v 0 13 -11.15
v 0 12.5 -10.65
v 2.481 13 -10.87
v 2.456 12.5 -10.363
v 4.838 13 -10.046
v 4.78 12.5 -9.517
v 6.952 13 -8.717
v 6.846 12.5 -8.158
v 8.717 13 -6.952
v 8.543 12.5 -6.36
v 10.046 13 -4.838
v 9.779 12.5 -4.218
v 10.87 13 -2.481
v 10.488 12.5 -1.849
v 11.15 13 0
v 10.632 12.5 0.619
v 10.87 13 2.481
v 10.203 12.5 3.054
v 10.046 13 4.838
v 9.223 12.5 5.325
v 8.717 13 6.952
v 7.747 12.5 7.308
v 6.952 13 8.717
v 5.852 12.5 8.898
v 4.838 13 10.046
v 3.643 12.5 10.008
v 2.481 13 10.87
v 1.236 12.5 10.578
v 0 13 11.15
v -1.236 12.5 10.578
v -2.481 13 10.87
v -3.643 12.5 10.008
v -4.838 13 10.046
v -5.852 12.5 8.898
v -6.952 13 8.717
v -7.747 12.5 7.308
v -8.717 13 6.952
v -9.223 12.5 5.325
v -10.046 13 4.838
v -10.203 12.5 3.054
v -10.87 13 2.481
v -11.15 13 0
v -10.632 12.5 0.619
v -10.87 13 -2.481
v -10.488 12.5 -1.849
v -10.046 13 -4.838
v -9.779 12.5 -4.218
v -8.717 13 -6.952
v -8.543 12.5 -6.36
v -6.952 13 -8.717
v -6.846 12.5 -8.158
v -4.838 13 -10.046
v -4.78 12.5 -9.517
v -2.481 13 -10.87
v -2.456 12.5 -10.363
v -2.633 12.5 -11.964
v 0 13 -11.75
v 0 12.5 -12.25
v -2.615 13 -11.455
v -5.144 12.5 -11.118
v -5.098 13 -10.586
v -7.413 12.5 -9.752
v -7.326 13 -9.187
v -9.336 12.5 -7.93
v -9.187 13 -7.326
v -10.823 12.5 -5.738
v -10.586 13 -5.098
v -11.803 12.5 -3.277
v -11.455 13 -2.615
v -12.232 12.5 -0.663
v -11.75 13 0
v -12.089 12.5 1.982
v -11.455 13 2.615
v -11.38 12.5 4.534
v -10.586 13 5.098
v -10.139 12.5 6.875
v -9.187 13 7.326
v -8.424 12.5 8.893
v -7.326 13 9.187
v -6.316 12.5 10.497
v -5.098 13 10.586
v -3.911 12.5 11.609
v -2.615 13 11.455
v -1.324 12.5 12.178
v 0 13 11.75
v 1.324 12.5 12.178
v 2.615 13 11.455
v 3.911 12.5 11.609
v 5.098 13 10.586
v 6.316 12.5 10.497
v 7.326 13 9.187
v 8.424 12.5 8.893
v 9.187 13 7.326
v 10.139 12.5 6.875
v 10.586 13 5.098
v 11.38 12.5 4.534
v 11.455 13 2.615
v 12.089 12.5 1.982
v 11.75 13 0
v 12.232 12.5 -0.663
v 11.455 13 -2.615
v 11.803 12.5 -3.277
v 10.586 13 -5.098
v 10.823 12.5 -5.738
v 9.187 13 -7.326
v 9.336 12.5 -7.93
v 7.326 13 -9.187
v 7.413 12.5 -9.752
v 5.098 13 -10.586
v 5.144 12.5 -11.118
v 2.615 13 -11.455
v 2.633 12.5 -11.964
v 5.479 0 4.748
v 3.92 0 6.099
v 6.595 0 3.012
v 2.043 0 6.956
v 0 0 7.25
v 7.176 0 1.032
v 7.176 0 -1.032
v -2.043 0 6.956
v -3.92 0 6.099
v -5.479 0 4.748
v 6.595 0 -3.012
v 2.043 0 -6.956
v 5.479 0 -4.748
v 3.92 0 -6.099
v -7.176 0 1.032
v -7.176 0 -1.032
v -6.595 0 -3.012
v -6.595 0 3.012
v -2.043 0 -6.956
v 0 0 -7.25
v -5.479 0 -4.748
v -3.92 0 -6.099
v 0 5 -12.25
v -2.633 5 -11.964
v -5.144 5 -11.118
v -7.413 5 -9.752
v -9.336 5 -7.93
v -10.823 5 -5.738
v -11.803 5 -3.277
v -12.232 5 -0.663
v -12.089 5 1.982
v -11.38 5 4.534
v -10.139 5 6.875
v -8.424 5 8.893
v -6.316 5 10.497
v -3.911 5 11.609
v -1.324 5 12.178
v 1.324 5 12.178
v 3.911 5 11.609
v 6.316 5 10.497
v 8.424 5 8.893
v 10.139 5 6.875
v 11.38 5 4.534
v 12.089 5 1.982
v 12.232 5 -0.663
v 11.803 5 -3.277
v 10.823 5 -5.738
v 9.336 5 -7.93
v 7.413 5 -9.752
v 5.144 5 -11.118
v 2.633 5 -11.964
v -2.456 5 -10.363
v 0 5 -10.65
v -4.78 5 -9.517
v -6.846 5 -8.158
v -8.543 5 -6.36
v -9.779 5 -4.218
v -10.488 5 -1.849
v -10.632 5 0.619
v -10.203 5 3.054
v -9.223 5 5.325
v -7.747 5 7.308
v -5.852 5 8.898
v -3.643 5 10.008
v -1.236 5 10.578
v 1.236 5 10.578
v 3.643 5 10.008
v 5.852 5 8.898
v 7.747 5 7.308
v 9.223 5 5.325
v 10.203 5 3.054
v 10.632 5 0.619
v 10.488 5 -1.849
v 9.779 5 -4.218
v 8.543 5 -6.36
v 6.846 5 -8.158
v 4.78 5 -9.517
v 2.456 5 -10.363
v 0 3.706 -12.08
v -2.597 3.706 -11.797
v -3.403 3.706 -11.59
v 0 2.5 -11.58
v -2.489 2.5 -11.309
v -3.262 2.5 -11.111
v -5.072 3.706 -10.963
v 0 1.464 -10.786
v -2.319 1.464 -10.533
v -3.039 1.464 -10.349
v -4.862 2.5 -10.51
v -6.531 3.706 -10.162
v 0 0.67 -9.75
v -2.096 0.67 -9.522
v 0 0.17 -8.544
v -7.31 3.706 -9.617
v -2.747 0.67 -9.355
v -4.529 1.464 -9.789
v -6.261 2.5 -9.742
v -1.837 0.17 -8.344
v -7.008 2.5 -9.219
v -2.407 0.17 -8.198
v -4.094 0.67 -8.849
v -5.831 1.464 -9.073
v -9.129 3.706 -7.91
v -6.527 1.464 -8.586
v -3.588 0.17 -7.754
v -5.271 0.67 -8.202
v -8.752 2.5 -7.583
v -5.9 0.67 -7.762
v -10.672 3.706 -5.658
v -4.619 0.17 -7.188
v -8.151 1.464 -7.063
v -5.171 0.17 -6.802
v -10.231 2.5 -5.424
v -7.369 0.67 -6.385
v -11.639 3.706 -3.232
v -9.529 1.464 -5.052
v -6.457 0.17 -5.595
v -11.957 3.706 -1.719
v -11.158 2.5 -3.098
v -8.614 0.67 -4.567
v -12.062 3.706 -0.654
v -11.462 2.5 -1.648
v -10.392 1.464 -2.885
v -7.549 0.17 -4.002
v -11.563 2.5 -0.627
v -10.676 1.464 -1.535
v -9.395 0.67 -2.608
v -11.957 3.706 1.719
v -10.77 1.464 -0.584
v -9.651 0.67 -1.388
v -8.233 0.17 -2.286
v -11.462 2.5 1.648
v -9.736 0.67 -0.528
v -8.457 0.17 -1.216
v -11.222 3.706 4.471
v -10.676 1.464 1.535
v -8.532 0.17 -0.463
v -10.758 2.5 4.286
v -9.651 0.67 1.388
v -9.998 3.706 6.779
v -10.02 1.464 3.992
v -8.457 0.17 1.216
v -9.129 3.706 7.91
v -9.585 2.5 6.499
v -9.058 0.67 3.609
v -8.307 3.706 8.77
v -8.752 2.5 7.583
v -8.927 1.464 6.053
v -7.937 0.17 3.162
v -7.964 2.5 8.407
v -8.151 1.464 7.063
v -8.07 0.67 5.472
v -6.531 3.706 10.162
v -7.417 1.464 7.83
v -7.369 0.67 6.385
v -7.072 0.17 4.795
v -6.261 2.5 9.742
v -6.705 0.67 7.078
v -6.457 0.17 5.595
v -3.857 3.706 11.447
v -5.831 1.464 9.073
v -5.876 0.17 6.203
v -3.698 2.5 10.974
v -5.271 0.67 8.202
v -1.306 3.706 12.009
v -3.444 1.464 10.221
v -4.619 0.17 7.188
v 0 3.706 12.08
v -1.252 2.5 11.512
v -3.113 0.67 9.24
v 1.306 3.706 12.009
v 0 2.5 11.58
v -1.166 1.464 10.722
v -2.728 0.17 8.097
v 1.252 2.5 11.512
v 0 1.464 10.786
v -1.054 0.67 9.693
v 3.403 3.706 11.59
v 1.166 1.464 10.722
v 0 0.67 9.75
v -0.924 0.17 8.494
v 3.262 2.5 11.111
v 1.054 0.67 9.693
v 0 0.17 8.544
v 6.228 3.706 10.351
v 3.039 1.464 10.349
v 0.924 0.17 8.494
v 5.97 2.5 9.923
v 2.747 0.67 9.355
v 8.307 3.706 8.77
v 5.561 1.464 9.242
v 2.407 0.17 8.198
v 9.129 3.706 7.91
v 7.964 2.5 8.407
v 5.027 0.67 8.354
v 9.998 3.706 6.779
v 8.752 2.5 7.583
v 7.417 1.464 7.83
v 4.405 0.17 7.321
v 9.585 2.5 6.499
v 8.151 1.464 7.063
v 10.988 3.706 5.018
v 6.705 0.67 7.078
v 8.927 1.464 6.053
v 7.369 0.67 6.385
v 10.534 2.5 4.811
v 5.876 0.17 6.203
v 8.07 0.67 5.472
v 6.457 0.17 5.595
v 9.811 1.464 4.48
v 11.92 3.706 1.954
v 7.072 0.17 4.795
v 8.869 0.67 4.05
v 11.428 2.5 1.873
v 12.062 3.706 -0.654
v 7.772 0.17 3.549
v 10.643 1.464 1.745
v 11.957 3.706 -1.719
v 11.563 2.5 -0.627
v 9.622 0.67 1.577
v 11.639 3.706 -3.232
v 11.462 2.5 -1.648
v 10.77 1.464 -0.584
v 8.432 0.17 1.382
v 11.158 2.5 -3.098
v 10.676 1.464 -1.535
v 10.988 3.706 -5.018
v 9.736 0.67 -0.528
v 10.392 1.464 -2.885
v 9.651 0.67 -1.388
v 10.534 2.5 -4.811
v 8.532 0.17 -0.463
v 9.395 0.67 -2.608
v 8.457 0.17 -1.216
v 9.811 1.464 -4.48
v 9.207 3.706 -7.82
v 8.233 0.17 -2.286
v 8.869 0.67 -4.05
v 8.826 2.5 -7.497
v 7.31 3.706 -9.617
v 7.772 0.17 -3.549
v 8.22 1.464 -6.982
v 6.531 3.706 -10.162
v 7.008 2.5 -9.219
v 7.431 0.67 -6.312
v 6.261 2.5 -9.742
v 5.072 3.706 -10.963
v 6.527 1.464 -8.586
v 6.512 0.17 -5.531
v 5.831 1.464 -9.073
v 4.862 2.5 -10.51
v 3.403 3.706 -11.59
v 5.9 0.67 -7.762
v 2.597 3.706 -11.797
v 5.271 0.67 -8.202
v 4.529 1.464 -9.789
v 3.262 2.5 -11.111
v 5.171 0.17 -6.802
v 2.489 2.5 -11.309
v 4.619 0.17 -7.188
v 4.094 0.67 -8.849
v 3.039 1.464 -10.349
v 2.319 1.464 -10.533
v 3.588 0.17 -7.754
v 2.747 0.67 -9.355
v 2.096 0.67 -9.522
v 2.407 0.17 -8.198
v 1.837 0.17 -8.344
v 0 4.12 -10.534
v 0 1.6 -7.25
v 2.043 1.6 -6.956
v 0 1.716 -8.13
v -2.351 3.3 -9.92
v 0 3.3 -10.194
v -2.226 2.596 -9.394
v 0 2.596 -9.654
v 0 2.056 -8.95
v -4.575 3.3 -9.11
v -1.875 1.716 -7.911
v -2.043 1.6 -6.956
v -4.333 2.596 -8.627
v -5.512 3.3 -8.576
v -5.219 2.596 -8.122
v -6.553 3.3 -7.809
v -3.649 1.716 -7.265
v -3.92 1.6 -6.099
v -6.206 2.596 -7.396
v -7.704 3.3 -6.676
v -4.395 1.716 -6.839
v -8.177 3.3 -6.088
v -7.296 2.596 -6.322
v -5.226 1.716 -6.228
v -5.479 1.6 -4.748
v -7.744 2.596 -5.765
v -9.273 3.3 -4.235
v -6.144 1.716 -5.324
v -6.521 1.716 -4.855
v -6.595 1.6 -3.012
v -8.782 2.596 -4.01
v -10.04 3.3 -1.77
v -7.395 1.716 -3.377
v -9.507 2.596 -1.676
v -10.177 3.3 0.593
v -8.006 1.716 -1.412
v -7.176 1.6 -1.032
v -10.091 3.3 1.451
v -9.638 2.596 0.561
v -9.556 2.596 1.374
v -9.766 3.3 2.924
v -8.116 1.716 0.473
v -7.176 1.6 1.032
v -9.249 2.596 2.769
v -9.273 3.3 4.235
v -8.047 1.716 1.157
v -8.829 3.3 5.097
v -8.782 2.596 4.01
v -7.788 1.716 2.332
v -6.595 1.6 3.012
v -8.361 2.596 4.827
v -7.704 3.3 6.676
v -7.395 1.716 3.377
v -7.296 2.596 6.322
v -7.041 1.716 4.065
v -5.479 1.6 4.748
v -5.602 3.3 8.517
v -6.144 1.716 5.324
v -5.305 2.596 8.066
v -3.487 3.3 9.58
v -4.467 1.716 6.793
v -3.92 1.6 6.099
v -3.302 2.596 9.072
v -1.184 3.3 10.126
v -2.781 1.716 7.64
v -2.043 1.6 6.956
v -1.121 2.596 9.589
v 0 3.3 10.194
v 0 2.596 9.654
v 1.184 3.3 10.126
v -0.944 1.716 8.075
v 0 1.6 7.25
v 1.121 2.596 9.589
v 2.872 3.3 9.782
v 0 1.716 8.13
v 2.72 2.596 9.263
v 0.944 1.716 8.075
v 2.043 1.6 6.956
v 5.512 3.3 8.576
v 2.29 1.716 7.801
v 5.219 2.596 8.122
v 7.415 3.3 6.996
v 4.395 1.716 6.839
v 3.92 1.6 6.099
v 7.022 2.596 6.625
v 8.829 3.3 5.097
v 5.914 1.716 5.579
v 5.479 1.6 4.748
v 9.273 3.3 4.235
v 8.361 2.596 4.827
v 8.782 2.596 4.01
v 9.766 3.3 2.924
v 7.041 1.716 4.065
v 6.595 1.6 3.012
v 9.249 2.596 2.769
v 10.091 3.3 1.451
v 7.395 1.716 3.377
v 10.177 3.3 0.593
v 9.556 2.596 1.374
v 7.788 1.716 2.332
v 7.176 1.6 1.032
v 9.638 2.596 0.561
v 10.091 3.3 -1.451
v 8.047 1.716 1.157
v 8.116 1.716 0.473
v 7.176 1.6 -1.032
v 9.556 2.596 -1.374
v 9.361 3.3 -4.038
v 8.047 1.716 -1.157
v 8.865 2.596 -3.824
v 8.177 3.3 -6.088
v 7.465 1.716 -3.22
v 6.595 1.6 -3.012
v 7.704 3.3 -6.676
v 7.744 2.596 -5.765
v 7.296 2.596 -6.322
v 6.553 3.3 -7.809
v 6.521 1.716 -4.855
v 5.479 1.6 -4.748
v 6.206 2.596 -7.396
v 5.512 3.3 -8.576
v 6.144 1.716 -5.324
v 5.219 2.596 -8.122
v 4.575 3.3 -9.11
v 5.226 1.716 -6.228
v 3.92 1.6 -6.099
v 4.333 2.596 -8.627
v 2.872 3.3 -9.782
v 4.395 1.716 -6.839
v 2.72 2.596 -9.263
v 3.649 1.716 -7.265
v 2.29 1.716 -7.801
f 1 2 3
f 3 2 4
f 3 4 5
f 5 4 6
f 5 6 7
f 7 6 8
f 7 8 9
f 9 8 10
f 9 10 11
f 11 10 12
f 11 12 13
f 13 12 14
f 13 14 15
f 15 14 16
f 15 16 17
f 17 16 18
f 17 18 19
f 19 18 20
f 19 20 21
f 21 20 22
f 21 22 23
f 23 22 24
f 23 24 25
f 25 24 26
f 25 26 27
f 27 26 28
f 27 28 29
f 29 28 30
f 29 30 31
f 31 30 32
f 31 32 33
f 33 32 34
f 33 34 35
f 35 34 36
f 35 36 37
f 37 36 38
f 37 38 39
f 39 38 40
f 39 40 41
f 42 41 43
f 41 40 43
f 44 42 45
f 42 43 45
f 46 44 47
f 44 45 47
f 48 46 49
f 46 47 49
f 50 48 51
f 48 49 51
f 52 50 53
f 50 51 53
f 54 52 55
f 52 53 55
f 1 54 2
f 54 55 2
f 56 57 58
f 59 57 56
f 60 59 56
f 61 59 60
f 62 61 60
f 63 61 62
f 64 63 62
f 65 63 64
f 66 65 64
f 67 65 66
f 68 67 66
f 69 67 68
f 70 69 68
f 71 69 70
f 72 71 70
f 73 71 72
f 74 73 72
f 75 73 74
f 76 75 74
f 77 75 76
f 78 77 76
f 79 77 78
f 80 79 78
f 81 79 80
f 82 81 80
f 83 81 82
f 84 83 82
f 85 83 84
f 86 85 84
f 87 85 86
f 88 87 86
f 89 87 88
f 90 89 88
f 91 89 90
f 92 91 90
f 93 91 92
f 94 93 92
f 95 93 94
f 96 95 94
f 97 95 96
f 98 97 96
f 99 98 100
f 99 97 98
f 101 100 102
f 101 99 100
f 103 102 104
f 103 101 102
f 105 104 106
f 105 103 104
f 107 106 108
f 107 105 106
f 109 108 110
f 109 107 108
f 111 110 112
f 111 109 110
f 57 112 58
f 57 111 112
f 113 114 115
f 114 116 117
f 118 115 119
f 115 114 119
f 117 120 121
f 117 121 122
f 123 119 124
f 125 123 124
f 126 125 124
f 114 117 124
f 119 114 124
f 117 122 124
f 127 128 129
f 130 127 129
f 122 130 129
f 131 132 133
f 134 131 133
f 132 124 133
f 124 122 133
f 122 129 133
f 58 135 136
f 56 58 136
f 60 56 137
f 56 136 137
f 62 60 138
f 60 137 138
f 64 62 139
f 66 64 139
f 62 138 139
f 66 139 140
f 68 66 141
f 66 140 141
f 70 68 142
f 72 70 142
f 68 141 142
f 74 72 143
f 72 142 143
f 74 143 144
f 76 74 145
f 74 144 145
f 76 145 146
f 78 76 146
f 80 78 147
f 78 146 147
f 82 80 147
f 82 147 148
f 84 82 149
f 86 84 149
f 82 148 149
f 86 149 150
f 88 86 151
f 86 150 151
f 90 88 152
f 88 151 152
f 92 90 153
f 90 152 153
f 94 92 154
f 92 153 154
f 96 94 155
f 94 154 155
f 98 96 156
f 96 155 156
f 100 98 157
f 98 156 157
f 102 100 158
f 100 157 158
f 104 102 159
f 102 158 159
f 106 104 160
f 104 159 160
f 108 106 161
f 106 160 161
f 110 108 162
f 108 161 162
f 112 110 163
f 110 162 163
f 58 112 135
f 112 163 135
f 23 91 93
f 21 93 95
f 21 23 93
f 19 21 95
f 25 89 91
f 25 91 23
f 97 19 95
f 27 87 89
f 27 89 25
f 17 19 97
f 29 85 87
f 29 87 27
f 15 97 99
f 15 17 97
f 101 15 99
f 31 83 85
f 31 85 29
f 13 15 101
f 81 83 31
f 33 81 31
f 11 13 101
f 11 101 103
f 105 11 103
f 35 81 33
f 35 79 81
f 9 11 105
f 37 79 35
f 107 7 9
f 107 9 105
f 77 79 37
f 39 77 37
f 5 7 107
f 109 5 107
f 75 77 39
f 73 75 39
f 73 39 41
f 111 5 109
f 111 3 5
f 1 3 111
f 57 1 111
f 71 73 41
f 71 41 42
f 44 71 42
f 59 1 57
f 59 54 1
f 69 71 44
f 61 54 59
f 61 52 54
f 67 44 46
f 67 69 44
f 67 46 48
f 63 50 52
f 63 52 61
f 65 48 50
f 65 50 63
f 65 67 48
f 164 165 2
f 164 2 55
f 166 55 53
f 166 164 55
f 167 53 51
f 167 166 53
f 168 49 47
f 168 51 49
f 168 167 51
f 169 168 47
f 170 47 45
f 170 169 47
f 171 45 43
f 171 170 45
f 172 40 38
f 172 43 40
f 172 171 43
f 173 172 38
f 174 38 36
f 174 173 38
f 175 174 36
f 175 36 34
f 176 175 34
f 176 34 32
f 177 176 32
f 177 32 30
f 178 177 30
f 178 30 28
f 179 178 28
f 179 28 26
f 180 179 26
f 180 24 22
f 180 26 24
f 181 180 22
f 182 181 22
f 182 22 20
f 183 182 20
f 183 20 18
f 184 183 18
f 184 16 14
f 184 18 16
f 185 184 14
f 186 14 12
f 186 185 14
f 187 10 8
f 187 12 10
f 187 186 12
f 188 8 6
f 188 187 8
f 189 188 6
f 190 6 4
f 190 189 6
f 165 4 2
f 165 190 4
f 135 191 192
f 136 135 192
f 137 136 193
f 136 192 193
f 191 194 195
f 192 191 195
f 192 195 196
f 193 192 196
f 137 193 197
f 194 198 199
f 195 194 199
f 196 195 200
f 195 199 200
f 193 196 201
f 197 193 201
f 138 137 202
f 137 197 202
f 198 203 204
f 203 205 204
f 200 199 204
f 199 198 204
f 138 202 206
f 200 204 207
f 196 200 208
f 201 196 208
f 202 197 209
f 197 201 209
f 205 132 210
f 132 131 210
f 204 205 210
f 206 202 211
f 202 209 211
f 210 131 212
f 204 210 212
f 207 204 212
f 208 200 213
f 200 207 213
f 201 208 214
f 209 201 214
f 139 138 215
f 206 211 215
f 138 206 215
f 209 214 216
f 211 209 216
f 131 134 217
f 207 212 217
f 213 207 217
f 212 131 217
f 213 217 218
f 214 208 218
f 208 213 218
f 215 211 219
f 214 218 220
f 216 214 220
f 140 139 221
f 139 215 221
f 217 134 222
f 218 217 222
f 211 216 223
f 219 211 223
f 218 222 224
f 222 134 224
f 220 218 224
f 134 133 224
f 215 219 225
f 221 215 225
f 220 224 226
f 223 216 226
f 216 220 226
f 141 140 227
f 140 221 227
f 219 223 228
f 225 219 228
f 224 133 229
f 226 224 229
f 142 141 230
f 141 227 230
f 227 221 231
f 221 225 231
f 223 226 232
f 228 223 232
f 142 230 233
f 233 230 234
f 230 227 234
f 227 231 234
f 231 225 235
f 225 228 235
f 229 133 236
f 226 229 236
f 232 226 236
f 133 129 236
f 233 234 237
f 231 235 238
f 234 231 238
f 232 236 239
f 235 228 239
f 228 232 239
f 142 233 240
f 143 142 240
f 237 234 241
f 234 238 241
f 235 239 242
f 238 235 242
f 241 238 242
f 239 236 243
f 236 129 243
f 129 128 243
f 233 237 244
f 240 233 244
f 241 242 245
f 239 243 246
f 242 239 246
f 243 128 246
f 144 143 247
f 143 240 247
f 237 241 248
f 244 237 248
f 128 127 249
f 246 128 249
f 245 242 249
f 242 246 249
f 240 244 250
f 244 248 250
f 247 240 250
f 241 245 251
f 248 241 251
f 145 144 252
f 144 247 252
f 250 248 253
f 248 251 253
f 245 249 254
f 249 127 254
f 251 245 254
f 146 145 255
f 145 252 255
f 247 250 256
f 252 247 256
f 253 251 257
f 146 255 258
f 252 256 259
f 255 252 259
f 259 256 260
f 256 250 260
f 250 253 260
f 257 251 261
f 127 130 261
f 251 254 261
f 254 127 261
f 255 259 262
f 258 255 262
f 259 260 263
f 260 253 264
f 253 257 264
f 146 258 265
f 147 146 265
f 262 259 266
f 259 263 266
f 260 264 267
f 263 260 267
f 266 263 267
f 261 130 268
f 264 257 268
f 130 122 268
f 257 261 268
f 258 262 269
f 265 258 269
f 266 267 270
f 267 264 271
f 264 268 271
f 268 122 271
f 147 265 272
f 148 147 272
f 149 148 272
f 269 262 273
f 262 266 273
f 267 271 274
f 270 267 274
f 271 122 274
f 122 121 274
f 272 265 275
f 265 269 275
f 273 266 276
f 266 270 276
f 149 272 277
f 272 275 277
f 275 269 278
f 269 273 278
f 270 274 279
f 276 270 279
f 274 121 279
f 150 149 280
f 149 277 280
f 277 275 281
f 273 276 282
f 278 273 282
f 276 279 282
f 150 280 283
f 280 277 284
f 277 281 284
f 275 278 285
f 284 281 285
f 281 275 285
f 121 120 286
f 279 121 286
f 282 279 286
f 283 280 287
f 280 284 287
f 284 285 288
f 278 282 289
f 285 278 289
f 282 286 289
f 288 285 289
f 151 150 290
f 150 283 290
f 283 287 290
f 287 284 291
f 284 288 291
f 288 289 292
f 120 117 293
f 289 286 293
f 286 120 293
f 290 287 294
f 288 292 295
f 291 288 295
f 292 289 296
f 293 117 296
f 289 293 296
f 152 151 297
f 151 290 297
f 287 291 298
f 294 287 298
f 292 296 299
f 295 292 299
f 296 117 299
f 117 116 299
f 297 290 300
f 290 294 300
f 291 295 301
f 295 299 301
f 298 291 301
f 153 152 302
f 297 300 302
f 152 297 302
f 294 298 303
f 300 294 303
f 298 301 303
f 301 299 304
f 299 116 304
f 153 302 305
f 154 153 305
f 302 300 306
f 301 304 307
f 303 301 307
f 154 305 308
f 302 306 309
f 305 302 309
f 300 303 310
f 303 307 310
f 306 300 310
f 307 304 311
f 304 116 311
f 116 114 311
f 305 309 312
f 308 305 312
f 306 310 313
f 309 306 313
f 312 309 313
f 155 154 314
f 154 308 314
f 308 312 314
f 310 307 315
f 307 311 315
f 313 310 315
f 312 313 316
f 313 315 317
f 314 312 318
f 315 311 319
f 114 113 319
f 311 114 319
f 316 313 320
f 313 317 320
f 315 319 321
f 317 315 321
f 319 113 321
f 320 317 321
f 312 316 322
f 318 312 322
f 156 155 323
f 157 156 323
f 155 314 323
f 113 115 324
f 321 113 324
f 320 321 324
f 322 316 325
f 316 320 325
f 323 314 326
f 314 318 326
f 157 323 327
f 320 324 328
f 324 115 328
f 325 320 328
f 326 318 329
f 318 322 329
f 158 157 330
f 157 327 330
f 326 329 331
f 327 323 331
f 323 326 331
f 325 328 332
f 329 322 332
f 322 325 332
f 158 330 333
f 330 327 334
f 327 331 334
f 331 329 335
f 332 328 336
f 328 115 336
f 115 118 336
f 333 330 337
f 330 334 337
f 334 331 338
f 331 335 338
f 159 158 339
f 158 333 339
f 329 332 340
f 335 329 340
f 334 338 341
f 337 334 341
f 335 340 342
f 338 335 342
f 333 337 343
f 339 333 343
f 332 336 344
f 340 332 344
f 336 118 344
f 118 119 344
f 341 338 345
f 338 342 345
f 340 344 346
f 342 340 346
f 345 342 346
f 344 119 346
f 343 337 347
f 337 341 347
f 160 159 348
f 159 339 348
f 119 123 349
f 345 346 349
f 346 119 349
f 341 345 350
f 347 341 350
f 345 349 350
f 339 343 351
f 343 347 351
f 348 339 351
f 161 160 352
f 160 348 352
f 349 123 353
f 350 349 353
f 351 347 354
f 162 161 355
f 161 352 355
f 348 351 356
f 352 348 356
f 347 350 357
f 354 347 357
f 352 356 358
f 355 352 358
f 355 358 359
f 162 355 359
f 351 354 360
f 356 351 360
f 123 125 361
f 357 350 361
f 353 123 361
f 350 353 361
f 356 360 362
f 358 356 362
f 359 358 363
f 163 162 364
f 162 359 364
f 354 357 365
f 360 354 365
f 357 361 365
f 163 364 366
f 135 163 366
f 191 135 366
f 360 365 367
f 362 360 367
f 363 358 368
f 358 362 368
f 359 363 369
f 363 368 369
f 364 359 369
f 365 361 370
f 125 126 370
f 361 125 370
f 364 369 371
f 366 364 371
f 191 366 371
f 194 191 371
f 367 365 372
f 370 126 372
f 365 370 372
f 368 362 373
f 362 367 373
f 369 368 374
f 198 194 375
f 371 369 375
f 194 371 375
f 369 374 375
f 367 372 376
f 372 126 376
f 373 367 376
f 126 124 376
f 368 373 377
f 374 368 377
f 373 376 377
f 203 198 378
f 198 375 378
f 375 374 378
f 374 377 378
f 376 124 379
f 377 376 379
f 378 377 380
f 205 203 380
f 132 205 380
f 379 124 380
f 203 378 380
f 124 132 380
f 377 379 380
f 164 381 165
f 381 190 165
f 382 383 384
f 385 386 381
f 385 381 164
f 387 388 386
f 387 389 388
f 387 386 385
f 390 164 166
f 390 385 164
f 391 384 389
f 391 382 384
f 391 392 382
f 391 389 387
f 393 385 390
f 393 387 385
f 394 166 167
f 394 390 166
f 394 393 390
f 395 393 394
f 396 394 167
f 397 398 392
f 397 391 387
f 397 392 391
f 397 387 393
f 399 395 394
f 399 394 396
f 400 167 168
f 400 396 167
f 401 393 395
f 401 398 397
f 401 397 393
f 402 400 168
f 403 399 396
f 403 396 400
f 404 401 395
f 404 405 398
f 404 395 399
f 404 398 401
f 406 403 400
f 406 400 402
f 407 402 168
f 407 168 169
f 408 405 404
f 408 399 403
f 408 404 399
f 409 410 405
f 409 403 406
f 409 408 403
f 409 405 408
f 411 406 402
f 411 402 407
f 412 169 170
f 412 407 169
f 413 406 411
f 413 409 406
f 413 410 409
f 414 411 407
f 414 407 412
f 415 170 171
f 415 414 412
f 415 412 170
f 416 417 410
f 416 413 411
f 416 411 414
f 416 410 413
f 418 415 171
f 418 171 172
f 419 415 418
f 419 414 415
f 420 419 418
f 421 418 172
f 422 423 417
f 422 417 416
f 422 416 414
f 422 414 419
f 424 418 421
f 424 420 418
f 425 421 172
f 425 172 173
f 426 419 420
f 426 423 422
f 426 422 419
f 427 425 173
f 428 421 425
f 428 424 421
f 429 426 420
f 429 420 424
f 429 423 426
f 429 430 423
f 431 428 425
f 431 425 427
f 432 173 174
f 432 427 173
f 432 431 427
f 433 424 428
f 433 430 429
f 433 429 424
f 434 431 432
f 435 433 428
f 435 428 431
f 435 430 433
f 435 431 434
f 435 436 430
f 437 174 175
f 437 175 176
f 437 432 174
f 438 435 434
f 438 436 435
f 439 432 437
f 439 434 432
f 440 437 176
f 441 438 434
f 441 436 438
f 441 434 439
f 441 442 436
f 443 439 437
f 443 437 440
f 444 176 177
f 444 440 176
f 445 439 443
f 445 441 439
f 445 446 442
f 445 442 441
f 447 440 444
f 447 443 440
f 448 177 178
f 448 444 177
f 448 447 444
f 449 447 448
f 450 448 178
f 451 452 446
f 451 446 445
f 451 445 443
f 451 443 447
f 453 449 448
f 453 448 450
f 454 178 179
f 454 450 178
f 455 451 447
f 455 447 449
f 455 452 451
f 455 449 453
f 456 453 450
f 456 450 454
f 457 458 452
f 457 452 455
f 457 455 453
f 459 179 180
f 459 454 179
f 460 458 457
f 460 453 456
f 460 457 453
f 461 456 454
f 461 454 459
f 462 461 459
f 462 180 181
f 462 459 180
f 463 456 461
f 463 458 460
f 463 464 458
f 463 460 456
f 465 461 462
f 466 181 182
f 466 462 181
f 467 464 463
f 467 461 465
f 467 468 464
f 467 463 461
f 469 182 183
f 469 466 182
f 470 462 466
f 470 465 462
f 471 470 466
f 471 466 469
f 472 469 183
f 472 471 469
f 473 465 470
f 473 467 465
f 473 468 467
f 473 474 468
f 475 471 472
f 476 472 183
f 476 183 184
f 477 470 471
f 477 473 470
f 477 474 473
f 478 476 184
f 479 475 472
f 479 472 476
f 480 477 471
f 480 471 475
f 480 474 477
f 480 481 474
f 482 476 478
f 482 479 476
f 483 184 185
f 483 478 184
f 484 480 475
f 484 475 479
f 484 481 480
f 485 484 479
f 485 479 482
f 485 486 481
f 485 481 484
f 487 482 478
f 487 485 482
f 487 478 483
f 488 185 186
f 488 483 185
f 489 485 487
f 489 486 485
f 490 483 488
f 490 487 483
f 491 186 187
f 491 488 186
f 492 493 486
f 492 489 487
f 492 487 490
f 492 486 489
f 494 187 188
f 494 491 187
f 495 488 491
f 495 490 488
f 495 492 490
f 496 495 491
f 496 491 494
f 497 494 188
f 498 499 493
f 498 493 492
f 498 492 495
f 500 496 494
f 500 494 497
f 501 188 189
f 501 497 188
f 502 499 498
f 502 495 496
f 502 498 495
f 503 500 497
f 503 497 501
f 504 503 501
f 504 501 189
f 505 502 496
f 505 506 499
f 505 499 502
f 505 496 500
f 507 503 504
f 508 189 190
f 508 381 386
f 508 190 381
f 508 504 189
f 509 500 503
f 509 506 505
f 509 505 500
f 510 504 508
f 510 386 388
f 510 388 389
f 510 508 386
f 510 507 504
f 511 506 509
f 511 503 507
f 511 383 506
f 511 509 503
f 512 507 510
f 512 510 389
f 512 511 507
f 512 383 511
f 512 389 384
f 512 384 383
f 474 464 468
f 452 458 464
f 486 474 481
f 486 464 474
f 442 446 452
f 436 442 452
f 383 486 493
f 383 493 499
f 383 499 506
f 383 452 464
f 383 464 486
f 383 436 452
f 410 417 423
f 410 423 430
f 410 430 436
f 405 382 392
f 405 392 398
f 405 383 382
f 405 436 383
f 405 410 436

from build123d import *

# Parameters (mm, degrees)
SKIZZE1_R                       = 12.25
AUFSATZ_LINEAR_AUSTRAGEN1_DEPTH = 13
VERRUNDUNG1_R                   = 5
WANDUNG1_T                      = -1.6
FASE1_SIZE                      = 0.5


with BuildPart() as part:
    # Skizze1 → Aufsatz-Linear austragen1 (new body)
    with BuildSketch(Plane(origin=(0, 0, 0), x_dir=(1, 0, 0), z_dir=(0, 1, 0))):
        with Locations(Location((0, 0, 0), (0, 0, 90))):
            Circle(SKIZZE1_R)
    extrude(amount=AUFSATZ_LINEAR_AUSTRAGEN1_DEPTH)

    # Verrundung1
    verrundung1_edges = [part.edges().sort_by_distance(p)[0] for p in [
        (0, 0, 12.25),
    ]]
    fillet(verrundung1_edges, radius=VERRUNDUNG1_R)

    # Wandung1
    wandung1_openings = [part.faces().sort_by_distance(p)[0] for p in [
        (0, 13, 0),
    ]]
    offset(amount=WANDUNG1_T, openings=wandung1_openings, kind=Kind.INTERSECTION)

    # Fase1
    fase1_edges = [part.edges().sort_by_distance(p)[0] for p in [
        (0, 13, 12.25),
        (0, 13, 10.65),
    ]]
    chamfer(fase1_edges, length=FASE1_SIZE)


solid = part.part
